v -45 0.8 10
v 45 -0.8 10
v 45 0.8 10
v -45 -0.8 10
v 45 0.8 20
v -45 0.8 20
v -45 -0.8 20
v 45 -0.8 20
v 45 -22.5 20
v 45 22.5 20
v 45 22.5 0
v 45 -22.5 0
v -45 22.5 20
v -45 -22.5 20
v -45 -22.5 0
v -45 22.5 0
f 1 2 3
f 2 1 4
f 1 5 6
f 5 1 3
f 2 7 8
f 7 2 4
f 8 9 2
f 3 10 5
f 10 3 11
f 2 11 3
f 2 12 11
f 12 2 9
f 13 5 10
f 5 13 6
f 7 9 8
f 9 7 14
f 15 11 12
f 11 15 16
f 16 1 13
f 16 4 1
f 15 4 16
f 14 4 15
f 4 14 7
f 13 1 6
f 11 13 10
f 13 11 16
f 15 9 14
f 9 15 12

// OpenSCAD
// Microscope slide drying rack
// Print orientation: base block on the bed (z = 0), slots open upward.

// ---------------- Parameters ----------------
block_len   = 90;    // base block length along X (mm)
block_wid   = 45;    // base block width along Y (mm)
block_h     = 20;    // base block height along Z (mm)

slot_count  = 10;    // number of slide slots
slot_len    = 77;    // slot length along X (mm)
slot_w      = 1.6;   // slot width along Y (mm)
slot_depth  = 10;    // slot depth from top face (mm)
slot_pitch  = 3.5;   // centre-to-centre slot spacing along Y (mm)

eps         = 0.5;   // overcut past faces to avoid coplanar surfaces (mm)

$fn = 64;

// ---------------- Model ----------------
difference() {
    // Solid base block, centred in X and Y, sitting on z = 0
    translate([-block_len / 2, -block_wid / 2, 0])
        cube([block_len, block_wid, block_h]);

    // Parallel slots running along X, centred as a group in X and Y
    for (i = [0 : slot_count - 1]) {
        x_c = (i - (slot_count - 1) / 2) * slot_pitch;
        translate([x_c - slot_len / 2, -slot_w / 2, block_h - slot_depth])
            cube([slot_len, slot_w, slot_depth + eps]);
    }
}
